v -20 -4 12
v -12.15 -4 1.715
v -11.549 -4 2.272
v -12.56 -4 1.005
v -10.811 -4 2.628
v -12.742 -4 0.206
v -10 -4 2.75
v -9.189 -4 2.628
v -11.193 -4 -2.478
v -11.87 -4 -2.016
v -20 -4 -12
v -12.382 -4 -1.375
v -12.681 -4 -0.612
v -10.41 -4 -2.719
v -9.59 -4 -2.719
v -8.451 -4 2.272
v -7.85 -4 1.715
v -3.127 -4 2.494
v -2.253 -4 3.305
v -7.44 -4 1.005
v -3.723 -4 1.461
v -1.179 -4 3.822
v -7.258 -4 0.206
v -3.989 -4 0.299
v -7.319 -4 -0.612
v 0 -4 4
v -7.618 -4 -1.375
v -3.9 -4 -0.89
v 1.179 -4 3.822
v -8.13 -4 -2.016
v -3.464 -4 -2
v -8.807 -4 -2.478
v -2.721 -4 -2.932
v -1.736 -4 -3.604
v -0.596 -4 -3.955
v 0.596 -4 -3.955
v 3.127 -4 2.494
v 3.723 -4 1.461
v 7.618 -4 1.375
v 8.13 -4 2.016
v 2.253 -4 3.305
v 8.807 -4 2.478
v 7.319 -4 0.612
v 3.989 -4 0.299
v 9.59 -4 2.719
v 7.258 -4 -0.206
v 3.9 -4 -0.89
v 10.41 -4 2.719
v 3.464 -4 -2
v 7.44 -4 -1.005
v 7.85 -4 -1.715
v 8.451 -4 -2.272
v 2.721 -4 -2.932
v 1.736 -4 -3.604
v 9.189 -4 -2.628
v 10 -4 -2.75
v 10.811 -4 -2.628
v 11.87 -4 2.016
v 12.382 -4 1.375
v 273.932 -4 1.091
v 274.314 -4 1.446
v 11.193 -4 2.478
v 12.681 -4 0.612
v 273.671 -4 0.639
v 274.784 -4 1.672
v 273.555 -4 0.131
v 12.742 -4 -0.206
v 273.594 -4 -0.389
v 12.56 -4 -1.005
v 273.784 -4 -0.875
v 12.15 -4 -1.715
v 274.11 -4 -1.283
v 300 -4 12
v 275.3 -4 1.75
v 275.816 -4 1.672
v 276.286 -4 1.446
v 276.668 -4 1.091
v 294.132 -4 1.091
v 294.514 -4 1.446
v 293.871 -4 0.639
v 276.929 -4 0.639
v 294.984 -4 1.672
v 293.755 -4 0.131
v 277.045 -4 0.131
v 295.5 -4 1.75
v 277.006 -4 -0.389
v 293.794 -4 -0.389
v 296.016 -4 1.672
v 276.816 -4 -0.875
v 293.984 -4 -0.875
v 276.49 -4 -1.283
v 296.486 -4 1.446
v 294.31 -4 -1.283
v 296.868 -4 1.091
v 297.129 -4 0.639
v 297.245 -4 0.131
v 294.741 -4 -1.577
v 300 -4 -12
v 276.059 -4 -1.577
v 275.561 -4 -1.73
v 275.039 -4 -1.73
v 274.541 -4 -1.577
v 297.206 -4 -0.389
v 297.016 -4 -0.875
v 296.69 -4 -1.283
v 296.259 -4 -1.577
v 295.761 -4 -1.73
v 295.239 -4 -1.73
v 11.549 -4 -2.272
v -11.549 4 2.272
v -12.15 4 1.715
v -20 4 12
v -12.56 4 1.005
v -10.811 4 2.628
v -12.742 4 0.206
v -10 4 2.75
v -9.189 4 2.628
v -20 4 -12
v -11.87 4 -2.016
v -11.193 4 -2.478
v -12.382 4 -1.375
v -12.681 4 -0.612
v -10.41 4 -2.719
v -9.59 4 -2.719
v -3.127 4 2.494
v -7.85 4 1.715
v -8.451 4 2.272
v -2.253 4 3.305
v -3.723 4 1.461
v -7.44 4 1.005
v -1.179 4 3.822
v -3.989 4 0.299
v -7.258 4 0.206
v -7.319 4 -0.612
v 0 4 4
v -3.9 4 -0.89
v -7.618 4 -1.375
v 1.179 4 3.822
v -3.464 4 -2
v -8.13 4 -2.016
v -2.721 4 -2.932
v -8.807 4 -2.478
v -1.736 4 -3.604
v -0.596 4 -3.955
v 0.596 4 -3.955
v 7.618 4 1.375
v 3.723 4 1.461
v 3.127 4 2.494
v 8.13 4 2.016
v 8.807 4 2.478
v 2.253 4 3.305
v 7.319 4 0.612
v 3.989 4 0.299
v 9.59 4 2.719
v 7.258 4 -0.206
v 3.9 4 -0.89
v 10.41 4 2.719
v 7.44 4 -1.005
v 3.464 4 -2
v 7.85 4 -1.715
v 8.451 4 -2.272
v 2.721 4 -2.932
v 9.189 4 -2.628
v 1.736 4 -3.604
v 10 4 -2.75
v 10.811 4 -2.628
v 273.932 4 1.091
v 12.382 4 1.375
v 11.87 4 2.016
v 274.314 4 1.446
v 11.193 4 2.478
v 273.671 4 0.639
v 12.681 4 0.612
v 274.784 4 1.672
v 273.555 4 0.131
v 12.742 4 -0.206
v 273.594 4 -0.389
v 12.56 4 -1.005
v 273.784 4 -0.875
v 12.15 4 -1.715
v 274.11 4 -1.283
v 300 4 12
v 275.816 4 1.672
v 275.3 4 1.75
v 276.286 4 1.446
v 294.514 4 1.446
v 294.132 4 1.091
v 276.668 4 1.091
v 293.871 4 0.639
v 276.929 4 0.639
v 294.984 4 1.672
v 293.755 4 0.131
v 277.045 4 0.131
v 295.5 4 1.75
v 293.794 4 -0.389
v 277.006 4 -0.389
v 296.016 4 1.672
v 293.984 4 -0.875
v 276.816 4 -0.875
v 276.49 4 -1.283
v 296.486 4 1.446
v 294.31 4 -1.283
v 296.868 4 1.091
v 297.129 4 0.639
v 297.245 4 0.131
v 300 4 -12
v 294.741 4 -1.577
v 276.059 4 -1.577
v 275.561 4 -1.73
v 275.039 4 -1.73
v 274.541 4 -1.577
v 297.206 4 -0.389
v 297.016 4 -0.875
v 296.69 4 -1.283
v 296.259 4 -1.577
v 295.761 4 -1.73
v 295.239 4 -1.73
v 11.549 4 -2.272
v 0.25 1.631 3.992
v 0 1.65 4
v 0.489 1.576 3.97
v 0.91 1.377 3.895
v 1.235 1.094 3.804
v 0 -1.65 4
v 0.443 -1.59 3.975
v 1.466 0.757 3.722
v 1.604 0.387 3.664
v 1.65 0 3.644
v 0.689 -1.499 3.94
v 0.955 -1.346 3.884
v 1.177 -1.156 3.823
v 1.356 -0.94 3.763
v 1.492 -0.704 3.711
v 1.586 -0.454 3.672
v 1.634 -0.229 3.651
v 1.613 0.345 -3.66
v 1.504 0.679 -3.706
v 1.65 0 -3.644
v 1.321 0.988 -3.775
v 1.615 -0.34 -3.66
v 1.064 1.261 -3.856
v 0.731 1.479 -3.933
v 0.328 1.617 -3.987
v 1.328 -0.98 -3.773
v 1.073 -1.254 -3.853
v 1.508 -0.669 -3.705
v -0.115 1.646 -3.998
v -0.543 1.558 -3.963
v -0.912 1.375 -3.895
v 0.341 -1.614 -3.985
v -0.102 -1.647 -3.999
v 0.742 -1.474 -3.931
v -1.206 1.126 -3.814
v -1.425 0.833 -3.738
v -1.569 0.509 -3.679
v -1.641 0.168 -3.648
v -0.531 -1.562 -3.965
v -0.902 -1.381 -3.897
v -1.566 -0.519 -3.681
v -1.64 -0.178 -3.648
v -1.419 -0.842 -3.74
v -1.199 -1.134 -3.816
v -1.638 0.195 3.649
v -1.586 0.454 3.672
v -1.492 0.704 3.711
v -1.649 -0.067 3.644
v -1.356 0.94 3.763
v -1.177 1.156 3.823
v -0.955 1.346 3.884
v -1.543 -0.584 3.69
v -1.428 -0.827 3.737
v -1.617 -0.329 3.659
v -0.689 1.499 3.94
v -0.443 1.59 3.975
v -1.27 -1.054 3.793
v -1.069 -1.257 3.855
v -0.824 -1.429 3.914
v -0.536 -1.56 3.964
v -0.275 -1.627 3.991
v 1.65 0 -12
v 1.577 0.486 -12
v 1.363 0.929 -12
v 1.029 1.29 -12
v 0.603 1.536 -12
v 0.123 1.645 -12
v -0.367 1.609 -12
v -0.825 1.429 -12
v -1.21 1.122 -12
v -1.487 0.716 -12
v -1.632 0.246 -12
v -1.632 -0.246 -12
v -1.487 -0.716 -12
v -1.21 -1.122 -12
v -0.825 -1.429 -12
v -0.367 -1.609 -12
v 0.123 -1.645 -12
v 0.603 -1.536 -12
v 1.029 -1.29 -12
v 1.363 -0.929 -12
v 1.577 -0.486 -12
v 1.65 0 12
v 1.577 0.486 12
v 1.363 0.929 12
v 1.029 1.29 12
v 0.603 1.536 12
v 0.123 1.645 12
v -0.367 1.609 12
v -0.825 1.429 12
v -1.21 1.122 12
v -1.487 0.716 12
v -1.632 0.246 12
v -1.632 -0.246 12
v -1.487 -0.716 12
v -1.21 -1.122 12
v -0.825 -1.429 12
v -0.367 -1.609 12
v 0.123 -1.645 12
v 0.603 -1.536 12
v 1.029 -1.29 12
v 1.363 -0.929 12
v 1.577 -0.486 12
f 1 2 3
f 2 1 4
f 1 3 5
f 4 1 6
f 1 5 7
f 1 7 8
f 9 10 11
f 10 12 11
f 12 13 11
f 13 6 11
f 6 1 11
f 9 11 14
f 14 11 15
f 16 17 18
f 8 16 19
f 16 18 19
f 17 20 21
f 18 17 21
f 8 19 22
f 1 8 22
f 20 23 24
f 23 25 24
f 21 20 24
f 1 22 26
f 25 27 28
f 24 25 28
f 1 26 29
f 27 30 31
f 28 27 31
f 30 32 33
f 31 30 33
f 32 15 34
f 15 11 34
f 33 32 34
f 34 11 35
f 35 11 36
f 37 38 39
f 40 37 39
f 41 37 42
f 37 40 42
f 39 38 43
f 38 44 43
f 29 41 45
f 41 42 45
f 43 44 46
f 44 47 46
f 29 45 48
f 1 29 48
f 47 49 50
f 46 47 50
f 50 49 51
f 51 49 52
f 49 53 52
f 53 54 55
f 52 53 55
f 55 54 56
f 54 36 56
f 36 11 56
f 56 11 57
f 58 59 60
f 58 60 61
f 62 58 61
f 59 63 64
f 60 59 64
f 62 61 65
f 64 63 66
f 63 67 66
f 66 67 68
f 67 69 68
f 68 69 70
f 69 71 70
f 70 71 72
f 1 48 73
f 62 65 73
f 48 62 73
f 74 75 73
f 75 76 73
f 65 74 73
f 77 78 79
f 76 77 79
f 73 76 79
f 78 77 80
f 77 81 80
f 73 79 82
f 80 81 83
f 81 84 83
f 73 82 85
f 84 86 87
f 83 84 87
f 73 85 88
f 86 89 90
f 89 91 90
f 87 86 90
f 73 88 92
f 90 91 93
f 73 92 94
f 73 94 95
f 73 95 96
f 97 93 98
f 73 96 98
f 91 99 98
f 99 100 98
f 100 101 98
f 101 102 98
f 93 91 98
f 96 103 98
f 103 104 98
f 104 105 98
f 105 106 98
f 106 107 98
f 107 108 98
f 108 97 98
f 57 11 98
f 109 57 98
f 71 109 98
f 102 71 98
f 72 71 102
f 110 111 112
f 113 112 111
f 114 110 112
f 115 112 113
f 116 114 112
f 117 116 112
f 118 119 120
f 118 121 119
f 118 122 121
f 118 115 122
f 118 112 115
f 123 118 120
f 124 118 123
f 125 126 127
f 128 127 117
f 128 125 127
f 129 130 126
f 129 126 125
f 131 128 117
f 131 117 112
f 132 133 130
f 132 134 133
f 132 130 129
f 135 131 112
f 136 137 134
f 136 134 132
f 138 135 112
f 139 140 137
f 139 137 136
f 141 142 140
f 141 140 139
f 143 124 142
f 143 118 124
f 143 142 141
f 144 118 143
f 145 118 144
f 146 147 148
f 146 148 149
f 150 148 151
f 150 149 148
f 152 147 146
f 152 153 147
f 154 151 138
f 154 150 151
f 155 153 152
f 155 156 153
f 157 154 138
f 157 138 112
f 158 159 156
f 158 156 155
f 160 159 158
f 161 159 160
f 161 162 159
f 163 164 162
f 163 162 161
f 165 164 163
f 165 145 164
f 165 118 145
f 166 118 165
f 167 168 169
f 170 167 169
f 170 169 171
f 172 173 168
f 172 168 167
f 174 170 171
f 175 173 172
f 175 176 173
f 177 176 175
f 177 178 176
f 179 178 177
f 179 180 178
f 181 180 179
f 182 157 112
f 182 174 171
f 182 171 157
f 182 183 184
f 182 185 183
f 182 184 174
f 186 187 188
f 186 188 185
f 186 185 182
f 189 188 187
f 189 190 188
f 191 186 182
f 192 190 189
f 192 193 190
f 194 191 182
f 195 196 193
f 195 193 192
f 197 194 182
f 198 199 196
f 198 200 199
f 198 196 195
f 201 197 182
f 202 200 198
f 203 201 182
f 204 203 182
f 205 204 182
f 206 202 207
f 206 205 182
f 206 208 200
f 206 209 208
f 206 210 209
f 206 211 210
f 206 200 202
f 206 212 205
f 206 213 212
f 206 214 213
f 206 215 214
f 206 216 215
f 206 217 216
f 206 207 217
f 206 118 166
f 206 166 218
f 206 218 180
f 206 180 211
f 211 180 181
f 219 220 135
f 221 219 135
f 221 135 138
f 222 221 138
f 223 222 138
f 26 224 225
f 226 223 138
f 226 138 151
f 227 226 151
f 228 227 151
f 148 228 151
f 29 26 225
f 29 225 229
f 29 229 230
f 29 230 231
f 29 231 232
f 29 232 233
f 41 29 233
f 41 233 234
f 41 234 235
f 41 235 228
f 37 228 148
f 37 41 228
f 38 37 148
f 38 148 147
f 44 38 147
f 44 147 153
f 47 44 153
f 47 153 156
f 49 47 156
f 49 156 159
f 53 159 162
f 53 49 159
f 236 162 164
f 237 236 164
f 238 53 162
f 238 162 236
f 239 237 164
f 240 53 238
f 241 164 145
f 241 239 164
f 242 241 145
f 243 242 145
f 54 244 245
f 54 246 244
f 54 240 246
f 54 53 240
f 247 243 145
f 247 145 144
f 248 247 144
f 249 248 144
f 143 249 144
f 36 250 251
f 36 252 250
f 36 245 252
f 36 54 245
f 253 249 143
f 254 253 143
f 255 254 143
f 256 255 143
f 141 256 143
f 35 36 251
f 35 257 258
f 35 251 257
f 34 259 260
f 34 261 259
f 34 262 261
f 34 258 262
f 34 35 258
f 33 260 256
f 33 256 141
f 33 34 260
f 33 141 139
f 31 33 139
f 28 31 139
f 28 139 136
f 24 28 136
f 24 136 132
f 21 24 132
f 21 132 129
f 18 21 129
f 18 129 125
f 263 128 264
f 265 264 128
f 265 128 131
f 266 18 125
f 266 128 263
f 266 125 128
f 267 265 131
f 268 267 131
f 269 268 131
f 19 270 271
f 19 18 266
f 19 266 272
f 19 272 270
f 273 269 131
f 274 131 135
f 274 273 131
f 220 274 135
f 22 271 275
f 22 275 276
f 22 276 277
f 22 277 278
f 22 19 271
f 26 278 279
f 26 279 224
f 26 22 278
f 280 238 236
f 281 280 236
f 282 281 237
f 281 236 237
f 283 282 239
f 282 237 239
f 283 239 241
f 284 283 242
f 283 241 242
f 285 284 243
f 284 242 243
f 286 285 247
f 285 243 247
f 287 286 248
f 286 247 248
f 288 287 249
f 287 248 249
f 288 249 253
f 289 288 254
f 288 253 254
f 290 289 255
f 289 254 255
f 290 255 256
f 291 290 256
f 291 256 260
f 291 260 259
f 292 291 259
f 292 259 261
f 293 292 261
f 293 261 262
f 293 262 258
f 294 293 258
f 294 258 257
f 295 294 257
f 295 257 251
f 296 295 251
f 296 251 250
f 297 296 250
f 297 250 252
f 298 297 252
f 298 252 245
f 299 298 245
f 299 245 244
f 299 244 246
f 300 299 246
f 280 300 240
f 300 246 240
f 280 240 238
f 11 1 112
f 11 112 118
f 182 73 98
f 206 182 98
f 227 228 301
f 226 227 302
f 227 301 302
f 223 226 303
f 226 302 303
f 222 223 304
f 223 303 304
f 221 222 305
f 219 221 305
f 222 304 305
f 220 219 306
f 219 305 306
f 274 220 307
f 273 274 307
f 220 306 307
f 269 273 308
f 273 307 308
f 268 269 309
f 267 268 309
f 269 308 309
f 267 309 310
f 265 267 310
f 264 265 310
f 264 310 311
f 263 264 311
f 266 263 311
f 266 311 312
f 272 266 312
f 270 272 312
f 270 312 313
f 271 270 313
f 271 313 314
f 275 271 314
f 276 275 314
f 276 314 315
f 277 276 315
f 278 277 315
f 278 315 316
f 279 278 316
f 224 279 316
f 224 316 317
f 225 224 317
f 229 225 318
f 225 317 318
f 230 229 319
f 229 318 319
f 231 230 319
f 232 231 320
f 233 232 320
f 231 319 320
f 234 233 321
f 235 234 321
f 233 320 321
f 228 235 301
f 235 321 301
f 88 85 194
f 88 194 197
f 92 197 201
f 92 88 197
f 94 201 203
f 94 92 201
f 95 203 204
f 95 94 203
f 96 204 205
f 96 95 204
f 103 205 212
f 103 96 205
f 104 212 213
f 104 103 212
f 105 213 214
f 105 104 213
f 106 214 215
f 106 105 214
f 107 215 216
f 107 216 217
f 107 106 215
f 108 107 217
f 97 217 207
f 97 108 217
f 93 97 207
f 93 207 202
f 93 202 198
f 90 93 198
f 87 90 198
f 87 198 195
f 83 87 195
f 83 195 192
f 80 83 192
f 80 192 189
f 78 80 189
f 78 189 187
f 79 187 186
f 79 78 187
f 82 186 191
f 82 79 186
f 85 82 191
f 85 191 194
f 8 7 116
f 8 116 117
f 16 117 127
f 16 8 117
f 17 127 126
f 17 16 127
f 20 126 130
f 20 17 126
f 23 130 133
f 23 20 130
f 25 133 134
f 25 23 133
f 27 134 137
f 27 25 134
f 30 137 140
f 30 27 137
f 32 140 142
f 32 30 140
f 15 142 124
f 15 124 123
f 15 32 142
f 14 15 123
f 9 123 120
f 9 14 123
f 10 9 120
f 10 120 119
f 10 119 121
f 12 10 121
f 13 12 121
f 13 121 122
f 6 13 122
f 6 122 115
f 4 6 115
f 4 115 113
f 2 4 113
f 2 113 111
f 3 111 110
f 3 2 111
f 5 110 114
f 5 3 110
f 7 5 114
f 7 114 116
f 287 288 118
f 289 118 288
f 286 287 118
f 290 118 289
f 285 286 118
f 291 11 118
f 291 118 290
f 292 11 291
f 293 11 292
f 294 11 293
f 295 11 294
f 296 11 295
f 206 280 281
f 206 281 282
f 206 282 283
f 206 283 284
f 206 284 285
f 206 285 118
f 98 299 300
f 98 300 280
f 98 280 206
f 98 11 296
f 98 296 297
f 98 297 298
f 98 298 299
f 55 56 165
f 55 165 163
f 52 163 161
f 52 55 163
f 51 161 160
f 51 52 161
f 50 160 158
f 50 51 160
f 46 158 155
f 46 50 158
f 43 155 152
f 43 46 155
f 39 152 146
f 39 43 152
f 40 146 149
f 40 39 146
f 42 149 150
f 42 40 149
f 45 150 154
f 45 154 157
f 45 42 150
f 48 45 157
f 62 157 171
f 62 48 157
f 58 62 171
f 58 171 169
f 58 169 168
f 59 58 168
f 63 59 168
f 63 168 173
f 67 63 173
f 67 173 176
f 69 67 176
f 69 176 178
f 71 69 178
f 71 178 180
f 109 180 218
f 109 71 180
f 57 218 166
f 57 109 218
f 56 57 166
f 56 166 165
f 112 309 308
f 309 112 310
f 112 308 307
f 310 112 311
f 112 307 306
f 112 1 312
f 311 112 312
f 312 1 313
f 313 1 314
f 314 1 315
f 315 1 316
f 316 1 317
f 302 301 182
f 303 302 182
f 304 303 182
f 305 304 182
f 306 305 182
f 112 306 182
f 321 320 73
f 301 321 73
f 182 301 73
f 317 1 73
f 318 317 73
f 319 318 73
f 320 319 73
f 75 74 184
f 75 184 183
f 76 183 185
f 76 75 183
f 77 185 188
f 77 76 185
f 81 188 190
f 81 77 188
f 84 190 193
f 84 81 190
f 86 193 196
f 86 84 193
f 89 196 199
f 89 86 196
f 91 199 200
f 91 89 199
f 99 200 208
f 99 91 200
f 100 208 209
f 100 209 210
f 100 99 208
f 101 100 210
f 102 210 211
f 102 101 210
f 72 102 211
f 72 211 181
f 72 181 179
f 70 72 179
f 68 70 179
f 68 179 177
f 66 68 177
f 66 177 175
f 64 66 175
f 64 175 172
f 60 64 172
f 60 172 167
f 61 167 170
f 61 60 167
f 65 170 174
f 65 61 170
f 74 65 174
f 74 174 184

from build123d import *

# Parameters (mm, degrees)
BOSS_EXTRUDE1_DEPTH              = 4
BOSS_EXTRUDE1_DEPTH_BACK         = 4
SKETCH1_W                        = 320
SKETCH1_H                        = 24
SKETCH1_R                        = 2.75
SKETCH1_R_2                      = 1.75
SKETCH1_R_3                      = 4
TAP_DRILL_FOR_M4X0_7_TAP1_REACH  = 302.985
TAP_DRILL_FOR_M4X0_7_TAP1_BORE_R = 1.65
TAP_DRILL_FOR_M4X0_7_TAP2_D      = 3.3


with BuildPart() as part:
    # Sketch1 → Boss-Extrude1 (new, two sides: drawn at the far end of the back side and taken through both)
    with BuildSketch(Plane(origin=(0, 0, 0), x_dir=(1, 0, 0), z_dir=(0, 1, 0)).offset(-BOSS_EXTRUDE1_DEPTH_BACK)):
        with Locations((140, 0)):
            Rectangle(SKETCH1_W, SKETCH1_H)
        with Locations(Location((-10, 0, 0), (0, 0, 270))):
            Circle(SKETCH1_R, mode=Mode.SUBTRACT)
        with Locations(Location((10, 0, 0), (0, 0, 90))):
            Circle(SKETCH1_R, mode=Mode.SUBTRACT)
        with Locations(Location((295.5, 0, 0), (0, 0, 270))):
            Circle(SKETCH1_R_2, mode=Mode.SUBTRACT)
        with Locations(Location((275.3, 0, 0), (0, 0, 270))):
            Circle(SKETCH1_R_2, mode=Mode.SUBTRACT)
        with Locations(Location((0, 0, 0), (0, 0, 270))):
            Circle(SKETCH1_R_3, mode=Mode.SUBTRACT)
    extrude(amount=BOSS_EXTRUDE1_DEPTH + BOSS_EXTRUDE1_DEPTH_BACK)

    # Tap Drill for M4x0.7 Tap1 bore → Tap Drill for M4x0.7 Tap1 (cut, up to next)
    with BuildSketch(Plane.XY.offset(12), mode=Mode.PRIVATE) as tap_drill_for_m4x0_7_tap1_sk1:
        Circle(TAP_DRILL_FOR_M4X0_7_TAP1_BORE_R)
    tap_drill_for_m4x0_7_tap1_tool1 = extrude(tap_drill_for_m4x0_7_tap1_sk1.sketch, amount=-TAP_DRILL_FOR_M4X0_7_TAP1_REACH, mode=Mode.PRIVATE) & part.part
    add(tap_drill_for_m4x0_7_tap1_tool1.solids().sort_by_distance((0, 0, 12))[0], mode=Mode.SUBTRACT)

    # Tap Drill for M4x0.7 Tap2 (through all)
    with Locations(Plane(origin=(0, 0, -12), x_dir=(-1, 0, 0), z_dir=(0, 0, -1))):
        with Locations((0, 0)):
            Hole(TAP_DRILL_FOR_M4X0_7_TAP2_D / 2)


solid = part.part
